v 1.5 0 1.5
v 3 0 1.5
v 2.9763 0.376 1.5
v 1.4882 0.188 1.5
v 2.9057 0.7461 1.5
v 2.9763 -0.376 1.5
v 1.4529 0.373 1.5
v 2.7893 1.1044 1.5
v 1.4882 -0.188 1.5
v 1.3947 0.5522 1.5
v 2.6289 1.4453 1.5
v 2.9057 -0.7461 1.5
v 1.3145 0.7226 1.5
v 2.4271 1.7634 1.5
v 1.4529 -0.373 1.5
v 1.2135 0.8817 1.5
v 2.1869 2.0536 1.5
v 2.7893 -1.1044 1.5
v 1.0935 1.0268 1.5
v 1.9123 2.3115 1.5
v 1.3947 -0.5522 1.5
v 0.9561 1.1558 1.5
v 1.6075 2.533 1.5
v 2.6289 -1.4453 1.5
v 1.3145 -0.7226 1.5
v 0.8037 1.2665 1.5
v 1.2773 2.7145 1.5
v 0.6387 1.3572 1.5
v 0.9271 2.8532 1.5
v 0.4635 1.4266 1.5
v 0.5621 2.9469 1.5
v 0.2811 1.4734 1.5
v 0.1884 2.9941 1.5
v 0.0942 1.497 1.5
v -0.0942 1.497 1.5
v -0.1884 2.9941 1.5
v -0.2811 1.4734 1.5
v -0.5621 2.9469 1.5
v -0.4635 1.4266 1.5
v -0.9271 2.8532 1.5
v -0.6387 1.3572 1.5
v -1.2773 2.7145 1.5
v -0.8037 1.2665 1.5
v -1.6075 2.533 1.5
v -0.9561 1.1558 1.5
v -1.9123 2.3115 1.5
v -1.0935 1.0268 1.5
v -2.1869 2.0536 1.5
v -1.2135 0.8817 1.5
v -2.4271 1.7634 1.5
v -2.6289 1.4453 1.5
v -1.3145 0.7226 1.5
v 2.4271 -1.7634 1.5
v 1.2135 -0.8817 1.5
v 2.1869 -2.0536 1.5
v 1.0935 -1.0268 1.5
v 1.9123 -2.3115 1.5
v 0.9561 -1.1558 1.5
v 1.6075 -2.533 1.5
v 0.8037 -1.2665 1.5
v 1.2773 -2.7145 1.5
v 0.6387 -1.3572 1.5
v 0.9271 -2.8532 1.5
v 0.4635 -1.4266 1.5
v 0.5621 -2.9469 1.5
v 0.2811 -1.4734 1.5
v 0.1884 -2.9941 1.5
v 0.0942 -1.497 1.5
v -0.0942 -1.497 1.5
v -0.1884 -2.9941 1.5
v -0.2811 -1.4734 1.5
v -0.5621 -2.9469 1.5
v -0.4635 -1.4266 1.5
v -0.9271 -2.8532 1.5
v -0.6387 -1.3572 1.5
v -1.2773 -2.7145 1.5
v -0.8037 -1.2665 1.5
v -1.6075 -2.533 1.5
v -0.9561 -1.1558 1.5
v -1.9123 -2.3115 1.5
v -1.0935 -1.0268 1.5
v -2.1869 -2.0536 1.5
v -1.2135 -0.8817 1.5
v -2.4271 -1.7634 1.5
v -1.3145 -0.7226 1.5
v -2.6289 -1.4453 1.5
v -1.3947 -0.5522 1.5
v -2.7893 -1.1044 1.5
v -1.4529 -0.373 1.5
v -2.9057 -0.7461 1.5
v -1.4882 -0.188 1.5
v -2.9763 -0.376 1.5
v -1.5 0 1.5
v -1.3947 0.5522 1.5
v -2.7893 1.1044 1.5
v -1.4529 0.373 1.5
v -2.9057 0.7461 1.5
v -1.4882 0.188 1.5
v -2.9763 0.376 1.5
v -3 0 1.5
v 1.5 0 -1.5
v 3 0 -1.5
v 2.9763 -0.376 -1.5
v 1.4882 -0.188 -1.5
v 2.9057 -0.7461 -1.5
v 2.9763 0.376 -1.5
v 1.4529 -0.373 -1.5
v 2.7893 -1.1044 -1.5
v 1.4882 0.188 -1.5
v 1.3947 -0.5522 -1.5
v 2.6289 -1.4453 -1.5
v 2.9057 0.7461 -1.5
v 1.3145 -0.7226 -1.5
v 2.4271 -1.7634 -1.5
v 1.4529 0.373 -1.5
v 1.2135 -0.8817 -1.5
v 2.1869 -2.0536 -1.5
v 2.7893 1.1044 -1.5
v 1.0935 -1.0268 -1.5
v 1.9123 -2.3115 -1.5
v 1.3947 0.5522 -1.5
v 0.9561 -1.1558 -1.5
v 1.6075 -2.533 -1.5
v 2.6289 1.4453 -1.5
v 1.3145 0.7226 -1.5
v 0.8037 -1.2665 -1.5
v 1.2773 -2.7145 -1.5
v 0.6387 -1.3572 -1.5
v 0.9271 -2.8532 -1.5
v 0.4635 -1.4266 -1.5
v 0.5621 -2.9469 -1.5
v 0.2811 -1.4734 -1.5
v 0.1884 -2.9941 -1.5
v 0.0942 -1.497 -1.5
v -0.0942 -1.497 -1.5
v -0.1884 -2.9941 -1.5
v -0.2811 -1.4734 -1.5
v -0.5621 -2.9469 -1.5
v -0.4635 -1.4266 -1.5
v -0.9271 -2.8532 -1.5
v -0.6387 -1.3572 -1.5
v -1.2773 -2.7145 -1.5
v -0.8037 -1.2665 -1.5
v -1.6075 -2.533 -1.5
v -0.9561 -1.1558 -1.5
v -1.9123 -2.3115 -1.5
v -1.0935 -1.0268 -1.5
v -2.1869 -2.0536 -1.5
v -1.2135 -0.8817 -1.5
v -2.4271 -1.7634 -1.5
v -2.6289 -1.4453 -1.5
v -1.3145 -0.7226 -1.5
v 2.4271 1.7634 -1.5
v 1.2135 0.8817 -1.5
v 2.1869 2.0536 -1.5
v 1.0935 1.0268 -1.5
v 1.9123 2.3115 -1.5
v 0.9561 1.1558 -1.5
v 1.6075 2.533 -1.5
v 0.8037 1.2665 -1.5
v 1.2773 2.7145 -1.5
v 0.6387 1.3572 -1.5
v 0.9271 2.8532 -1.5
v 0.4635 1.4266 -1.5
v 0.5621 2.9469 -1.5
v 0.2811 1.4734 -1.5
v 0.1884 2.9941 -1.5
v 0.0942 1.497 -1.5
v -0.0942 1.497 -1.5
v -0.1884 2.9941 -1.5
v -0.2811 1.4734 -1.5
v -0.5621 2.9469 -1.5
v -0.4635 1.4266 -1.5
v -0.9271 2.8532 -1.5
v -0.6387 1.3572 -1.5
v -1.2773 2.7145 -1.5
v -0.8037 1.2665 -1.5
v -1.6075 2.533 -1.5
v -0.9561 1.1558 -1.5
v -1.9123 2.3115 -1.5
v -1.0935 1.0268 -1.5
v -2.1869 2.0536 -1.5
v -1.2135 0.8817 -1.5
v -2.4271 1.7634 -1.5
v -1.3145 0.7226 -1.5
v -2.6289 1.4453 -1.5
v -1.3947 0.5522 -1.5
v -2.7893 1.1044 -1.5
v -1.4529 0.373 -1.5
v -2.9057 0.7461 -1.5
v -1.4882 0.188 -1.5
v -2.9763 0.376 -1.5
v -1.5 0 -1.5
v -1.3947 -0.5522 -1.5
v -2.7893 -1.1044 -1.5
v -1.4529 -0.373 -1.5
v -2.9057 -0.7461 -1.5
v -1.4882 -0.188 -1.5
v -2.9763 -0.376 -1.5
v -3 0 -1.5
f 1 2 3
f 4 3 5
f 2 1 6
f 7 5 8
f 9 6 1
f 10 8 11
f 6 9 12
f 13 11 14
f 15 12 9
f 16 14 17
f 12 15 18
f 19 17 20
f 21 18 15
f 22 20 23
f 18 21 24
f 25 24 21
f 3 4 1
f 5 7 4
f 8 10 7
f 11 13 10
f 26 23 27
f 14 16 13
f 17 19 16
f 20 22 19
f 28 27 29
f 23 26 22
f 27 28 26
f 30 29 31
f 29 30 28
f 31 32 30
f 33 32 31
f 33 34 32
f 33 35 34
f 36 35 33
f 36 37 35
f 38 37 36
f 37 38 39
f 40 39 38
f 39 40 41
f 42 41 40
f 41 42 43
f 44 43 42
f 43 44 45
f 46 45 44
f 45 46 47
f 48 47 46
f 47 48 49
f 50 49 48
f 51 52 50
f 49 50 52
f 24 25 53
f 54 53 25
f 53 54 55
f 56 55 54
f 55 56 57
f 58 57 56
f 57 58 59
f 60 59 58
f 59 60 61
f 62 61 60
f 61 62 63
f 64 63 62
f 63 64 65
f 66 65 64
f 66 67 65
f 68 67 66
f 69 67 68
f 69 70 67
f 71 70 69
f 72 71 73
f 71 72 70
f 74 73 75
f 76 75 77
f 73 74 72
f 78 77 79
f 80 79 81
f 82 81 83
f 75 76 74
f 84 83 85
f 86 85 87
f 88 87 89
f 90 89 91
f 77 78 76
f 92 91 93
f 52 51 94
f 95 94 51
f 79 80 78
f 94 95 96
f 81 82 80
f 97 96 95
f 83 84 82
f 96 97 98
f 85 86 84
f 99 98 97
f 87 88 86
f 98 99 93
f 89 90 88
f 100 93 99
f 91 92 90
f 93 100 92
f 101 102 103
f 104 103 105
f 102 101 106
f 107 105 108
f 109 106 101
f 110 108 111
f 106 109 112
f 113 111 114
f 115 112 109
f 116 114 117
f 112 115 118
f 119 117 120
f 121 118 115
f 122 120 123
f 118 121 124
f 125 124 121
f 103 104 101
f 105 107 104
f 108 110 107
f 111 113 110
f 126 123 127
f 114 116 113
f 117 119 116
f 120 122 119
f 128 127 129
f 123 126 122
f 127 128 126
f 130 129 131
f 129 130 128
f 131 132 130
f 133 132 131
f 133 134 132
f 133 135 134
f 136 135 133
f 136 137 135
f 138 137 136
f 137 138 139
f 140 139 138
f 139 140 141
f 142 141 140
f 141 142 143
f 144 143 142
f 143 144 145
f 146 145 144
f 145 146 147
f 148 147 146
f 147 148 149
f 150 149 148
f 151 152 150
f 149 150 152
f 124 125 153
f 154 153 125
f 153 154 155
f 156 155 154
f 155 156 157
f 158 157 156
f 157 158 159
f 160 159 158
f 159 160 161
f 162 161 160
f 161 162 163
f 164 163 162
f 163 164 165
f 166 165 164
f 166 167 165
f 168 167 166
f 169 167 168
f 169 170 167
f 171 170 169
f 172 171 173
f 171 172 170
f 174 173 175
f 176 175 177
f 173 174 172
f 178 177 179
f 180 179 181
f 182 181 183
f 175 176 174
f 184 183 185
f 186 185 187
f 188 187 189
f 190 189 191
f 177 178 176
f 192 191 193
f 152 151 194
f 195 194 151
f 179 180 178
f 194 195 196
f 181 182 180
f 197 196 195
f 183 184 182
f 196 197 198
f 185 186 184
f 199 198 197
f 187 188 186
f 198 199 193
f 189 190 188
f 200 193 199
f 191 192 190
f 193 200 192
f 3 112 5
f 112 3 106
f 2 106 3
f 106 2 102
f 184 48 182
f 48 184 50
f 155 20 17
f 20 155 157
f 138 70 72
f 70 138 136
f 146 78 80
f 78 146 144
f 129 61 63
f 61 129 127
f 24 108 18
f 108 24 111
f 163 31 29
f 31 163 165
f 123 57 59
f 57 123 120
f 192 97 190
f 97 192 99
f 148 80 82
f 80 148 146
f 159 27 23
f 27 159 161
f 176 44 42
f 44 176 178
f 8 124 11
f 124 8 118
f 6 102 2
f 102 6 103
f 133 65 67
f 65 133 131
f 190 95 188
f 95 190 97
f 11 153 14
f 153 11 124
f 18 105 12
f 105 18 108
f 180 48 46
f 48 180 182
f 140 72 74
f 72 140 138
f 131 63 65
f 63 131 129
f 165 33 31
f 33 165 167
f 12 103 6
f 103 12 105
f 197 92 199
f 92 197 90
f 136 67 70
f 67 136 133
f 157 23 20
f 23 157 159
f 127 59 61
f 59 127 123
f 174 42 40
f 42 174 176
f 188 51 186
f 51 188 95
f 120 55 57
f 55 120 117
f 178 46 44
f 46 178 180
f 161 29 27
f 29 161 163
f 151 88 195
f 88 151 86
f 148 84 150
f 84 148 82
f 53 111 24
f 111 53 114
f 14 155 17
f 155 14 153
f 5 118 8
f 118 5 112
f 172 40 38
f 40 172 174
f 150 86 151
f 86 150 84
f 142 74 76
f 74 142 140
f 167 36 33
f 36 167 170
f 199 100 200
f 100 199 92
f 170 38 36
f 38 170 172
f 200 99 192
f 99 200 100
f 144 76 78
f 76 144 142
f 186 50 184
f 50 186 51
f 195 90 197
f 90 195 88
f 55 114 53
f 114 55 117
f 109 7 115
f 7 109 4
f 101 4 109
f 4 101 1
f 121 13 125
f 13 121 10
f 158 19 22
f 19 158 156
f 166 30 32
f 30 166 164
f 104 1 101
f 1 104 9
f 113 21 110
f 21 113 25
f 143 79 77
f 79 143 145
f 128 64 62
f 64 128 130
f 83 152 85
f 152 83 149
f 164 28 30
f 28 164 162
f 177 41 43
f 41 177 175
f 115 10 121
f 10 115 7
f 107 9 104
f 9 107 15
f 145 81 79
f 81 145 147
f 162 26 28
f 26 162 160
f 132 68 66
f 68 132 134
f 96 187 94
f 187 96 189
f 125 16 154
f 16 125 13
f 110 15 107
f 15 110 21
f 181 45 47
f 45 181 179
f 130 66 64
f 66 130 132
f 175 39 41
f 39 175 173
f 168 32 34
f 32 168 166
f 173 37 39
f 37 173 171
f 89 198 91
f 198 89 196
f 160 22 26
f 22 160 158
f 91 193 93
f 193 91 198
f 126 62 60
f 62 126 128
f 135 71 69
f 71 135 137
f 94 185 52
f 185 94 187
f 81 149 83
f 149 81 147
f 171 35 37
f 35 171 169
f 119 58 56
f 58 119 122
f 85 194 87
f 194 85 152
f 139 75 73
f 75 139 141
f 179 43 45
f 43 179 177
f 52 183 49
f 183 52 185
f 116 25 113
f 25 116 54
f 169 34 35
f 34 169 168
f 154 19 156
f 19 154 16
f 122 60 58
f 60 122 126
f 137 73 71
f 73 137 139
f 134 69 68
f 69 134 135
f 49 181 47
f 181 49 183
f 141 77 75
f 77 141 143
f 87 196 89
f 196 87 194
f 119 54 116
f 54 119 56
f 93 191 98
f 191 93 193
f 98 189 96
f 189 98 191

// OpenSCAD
$fn = 50;


difference() {
	union() {
		translate(v = [0, 0, -1.5000000000]) {
			cylinder(h = 3, r = 1.0000000000);
		}
		translate(v = [0, 0, -1.5000000000]) {
			cylinder(h = 3, r = 3.0000000000);
		}
	}
	union() {
		translate(v = [0, 0, -100.0000000000]) {
			cylinder(h = 200, r = 1.5000000000);
		}
	}
}
